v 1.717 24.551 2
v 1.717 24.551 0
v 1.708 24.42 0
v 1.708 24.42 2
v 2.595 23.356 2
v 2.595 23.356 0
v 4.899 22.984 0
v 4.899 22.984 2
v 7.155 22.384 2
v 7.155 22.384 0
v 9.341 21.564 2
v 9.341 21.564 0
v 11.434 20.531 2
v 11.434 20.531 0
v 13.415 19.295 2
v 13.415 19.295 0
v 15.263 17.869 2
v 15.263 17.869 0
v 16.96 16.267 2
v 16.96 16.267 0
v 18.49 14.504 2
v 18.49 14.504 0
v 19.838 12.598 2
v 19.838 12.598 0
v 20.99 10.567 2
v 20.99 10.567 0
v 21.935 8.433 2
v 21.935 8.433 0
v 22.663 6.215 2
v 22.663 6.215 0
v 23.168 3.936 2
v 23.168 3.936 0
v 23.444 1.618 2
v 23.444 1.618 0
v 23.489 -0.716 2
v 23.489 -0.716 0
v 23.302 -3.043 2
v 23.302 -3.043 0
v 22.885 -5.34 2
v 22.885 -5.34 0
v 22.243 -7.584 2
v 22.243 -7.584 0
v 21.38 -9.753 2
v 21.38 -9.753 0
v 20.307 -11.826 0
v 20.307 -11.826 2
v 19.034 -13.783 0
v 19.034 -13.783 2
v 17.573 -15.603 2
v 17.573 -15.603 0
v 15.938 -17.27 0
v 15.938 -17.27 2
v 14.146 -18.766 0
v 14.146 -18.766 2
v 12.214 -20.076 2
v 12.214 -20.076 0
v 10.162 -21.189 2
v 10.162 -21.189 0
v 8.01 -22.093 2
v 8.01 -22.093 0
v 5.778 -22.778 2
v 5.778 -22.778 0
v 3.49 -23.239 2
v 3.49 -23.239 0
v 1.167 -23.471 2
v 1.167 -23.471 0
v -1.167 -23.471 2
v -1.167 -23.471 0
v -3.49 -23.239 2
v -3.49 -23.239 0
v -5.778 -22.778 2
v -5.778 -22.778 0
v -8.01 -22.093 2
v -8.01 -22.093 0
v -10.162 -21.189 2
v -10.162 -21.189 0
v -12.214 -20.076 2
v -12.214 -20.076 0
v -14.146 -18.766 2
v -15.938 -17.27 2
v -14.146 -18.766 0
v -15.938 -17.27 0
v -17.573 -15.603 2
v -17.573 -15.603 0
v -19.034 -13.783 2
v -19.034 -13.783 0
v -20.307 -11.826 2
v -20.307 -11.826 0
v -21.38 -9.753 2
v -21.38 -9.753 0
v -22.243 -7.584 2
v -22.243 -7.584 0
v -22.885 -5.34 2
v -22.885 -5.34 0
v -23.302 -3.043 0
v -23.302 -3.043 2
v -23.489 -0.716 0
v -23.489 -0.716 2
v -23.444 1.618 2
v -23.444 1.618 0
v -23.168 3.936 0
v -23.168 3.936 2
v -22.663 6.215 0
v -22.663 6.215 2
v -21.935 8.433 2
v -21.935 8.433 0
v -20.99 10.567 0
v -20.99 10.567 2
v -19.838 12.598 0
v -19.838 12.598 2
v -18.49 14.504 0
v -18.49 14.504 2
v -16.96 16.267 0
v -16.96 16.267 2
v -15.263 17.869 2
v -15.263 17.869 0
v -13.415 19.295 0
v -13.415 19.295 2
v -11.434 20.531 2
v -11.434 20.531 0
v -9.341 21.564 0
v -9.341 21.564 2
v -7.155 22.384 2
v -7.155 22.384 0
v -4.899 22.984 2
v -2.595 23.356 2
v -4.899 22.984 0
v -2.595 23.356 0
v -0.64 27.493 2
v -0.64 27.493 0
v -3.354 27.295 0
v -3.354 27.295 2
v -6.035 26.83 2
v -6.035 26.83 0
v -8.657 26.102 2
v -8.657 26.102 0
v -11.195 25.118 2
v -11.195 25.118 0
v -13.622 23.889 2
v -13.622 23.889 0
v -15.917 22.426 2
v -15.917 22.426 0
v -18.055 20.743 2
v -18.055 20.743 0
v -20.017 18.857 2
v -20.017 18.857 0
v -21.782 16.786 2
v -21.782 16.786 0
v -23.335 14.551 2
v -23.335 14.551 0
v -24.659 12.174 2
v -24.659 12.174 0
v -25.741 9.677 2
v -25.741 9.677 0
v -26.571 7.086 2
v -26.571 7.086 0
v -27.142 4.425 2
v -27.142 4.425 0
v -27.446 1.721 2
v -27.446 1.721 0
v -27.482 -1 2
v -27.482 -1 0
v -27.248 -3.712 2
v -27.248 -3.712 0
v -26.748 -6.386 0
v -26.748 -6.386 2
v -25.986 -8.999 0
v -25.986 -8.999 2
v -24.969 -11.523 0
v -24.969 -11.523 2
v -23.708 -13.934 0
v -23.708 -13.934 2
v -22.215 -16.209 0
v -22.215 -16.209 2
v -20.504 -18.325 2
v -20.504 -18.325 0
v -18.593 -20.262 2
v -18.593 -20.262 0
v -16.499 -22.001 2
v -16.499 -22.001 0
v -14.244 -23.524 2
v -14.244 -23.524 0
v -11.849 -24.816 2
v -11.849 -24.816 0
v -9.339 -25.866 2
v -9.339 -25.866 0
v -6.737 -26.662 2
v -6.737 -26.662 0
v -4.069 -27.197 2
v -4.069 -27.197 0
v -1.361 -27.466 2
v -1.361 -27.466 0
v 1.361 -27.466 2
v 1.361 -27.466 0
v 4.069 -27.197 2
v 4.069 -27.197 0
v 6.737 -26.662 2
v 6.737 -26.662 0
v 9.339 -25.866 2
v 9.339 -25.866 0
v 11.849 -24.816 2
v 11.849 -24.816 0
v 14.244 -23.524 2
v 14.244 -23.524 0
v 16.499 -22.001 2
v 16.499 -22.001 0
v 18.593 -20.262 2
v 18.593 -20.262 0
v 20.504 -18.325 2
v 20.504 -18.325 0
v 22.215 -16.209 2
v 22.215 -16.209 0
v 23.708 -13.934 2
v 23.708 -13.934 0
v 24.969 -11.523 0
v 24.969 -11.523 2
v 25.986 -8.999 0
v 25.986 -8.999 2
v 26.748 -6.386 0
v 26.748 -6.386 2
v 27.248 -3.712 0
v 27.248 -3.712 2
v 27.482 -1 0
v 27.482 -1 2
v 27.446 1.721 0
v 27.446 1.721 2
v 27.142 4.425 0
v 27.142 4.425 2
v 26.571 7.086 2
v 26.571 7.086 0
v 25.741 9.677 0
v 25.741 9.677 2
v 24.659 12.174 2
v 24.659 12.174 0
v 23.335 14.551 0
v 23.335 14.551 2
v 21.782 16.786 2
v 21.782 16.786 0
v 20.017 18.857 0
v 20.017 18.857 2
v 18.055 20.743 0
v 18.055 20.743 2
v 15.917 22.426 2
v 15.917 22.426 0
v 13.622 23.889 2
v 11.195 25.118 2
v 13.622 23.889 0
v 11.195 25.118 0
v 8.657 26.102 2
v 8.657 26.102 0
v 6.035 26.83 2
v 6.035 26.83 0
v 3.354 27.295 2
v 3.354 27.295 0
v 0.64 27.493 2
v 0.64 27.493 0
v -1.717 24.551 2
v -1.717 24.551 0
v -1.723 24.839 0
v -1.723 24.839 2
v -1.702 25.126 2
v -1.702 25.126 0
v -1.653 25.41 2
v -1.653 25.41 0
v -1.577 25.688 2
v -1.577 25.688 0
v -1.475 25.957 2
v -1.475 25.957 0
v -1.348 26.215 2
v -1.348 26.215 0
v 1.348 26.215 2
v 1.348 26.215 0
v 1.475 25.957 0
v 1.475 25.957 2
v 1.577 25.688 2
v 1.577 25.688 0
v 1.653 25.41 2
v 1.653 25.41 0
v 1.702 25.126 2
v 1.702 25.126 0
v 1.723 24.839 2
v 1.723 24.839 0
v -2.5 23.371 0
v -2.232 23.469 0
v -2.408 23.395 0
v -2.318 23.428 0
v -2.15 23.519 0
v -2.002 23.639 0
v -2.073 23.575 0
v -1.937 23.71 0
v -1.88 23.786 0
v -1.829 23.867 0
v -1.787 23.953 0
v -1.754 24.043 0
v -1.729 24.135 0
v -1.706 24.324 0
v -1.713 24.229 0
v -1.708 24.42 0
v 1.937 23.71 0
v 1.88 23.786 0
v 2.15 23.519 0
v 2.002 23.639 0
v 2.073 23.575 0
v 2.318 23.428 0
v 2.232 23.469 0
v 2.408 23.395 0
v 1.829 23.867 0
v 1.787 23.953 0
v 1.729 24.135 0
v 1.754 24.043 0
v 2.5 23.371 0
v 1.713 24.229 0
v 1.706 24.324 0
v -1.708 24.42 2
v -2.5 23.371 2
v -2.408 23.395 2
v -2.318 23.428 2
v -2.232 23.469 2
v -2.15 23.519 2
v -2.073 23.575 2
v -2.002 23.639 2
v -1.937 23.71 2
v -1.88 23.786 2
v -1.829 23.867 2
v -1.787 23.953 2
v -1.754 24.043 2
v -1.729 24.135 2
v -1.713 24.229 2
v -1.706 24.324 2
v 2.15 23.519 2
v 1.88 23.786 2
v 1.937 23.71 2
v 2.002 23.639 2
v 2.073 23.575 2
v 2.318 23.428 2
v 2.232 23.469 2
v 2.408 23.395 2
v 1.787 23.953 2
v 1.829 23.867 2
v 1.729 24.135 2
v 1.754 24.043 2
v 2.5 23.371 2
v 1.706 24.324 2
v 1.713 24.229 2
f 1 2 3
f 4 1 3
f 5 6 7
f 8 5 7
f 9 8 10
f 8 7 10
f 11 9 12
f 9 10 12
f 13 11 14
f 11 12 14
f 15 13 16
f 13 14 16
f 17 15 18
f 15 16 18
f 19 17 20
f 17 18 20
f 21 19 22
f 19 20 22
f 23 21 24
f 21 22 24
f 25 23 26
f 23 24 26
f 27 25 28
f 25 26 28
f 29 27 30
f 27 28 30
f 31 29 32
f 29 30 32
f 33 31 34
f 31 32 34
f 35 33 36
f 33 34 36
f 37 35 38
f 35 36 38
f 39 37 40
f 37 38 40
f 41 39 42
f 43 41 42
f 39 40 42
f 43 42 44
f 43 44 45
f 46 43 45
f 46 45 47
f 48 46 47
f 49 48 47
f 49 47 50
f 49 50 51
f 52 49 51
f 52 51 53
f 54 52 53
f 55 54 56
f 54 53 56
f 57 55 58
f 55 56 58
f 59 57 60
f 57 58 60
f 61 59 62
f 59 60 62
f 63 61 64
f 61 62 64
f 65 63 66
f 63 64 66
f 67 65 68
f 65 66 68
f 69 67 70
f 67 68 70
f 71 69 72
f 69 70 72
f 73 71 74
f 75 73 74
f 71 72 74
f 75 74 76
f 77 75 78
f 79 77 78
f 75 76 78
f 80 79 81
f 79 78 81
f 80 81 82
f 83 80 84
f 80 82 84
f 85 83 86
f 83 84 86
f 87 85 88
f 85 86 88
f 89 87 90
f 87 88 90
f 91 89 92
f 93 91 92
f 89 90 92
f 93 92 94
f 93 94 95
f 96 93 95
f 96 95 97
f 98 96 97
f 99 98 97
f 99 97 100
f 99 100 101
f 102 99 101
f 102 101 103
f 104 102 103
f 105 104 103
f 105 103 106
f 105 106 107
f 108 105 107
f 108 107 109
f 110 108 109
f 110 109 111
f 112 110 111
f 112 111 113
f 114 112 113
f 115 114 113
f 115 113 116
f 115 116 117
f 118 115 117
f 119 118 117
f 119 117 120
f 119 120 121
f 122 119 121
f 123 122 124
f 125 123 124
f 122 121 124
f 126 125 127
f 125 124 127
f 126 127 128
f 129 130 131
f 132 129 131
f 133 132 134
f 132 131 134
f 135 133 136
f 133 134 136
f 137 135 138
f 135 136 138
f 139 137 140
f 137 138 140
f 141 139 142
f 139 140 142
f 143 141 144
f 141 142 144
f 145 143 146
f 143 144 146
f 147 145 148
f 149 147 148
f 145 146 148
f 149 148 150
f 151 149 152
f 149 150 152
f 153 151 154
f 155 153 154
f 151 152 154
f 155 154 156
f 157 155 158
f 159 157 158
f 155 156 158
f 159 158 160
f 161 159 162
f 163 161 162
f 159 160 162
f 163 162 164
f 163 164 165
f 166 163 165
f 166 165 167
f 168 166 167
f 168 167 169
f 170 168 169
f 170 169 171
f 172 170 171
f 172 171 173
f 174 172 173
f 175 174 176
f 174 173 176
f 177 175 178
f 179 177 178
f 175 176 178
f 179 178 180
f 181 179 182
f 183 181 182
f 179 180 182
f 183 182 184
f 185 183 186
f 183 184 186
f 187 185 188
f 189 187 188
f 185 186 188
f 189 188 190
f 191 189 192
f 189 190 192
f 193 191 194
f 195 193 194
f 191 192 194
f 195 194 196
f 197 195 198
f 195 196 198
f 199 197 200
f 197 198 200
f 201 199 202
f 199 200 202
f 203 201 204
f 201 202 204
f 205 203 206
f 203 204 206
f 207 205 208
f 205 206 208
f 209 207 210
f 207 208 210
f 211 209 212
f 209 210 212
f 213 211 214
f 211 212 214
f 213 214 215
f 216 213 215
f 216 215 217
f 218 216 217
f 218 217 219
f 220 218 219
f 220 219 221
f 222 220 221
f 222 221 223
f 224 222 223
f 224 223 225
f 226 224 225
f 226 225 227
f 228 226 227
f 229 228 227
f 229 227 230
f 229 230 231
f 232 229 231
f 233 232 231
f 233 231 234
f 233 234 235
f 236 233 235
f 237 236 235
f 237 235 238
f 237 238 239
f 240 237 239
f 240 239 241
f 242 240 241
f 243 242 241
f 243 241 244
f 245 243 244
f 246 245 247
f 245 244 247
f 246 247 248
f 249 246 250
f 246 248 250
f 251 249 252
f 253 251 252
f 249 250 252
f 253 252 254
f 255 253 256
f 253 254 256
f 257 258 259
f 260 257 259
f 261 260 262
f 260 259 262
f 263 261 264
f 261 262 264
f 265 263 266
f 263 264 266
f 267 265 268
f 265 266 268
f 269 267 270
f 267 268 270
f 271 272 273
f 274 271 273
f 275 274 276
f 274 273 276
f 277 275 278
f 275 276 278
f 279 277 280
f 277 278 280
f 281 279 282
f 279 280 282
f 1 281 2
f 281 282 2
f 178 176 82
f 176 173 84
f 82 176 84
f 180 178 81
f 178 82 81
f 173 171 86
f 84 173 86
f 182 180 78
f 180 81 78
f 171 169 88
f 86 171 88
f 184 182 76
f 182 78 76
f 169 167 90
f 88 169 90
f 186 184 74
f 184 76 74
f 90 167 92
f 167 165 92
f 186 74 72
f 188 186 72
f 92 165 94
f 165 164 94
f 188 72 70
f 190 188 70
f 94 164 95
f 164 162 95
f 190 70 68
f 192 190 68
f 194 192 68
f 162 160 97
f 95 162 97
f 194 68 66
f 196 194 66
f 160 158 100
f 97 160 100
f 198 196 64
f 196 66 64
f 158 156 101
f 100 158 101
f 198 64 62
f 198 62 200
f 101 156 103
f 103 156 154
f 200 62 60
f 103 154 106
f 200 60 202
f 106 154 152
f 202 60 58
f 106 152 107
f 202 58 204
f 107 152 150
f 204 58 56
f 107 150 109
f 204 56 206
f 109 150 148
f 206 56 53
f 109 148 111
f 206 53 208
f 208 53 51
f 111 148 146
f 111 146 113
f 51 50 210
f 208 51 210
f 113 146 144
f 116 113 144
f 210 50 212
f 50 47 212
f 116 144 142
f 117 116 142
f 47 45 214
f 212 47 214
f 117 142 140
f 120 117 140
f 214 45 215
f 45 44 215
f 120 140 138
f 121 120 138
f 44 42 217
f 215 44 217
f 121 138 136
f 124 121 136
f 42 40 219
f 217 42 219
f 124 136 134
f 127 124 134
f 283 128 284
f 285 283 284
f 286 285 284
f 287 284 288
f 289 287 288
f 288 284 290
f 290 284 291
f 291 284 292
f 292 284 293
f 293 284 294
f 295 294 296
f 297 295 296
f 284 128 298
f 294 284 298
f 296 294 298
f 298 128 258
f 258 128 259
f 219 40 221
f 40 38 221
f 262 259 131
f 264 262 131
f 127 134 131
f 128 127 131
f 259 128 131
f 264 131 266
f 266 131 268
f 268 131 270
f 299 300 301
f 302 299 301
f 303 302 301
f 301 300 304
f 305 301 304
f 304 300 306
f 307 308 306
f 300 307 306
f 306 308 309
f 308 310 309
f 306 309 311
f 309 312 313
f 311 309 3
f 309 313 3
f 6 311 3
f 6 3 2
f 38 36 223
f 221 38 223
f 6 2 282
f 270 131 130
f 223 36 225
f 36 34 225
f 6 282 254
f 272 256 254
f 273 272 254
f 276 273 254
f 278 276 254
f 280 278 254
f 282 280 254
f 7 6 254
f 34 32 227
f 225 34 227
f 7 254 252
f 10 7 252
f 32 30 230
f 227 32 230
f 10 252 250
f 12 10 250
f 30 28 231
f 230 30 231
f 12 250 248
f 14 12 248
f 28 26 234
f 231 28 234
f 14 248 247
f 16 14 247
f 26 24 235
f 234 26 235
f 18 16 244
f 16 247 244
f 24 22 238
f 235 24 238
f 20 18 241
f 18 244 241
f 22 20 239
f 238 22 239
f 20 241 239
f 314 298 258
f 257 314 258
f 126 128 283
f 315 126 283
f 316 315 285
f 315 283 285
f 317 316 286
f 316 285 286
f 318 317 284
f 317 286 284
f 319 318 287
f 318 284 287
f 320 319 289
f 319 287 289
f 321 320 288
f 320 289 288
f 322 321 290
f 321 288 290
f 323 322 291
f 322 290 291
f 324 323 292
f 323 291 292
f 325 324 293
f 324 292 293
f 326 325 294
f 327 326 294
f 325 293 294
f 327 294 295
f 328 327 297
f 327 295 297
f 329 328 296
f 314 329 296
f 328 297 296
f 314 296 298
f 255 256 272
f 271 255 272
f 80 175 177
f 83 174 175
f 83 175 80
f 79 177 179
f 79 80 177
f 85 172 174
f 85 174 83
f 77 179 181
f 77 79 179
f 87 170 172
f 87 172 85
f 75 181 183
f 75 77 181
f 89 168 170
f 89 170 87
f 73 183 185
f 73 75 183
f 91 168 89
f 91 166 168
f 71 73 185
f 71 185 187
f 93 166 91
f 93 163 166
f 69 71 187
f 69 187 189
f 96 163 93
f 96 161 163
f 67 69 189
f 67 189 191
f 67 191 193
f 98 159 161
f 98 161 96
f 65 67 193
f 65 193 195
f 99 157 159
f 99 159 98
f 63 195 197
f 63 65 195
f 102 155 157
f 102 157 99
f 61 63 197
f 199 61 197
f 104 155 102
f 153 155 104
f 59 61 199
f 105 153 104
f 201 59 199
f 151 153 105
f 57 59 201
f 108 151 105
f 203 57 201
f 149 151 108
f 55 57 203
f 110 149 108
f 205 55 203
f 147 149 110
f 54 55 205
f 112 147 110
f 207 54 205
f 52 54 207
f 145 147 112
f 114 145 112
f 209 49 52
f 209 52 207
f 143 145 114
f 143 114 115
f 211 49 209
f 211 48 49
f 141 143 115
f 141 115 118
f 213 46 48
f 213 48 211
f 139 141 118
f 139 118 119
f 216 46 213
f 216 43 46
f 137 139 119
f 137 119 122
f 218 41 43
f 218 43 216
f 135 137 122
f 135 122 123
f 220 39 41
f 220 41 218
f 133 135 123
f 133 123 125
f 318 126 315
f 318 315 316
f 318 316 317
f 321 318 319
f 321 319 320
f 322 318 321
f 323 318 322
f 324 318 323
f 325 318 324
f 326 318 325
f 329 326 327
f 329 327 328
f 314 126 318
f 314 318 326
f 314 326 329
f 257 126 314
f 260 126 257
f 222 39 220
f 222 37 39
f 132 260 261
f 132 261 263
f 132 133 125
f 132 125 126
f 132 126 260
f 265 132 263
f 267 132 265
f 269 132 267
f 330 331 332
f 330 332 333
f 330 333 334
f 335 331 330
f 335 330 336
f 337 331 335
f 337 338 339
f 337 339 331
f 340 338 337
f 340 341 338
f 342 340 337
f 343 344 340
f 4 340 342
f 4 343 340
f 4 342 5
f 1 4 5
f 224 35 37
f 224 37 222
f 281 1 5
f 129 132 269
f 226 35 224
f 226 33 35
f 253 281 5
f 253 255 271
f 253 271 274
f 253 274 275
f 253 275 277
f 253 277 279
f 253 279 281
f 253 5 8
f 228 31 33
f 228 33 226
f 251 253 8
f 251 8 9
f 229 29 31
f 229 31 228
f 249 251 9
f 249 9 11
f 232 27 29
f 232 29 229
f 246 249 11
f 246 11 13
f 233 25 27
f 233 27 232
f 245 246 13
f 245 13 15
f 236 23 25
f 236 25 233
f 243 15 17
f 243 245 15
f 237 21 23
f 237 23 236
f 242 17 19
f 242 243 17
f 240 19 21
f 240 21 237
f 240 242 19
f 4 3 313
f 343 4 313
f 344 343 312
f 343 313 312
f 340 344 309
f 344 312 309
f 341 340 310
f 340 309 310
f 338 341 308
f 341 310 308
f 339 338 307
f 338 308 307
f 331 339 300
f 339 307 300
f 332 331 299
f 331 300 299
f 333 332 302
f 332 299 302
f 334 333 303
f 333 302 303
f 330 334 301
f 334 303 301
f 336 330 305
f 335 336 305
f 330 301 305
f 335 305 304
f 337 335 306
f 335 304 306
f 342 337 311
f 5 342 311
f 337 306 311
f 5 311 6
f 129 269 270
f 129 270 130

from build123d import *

# Parameters (mm, degrees)
ESTRUSIONE_ESTRUSIONE1_DEPTH = 2


with BuildPart() as part:
    # Schizzo1 → Estrusione-Estrusione1 (new body)
    with BuildSketch(Plane.XY):
        with BuildLine():
            Line((-1.707609412, 24.419952295), (-1.716801654, 24.55140748))
            ThreePointArc((-1.716801654, 24.55140748), (-1.652997524, 25.409995743), (-1.347968624, 26.215105762))
            Line((-1.347968624, 26.215105762), (-0.639867053, 27.492554813))
            ThreePointArc((-0.639867053, 27.492554813), (0, -27.5), (0.639867053, 27.492554813))
            Line((0.639867053, 27.492554813), (1.347968624, 26.215105762))
            ThreePointArc((1.347968624, 26.215105762), (1.652997524, 25.409995743), (1.716801654, 24.55140748))
            Line((1.716801654, 24.55140748), (1.707609412, 24.419952295))
            ThreePointArc((1.707609412, 24.419952295), (1.937229379, 23.709678932), (2.594758219, 23.356310278))
            ThreePointArc((2.594758219, 23.356310278), (0, -23.5), (-2.594758219, 23.356310278))
            ThreePointArc((-2.594758219, 23.356310278), (-1.937229379, 23.709678932), (-1.707609412, 24.419952295))
        make_face()
    extrude(amount=ESTRUSIONE_ESTRUSIONE1_DEPTH)


solid = part.part
